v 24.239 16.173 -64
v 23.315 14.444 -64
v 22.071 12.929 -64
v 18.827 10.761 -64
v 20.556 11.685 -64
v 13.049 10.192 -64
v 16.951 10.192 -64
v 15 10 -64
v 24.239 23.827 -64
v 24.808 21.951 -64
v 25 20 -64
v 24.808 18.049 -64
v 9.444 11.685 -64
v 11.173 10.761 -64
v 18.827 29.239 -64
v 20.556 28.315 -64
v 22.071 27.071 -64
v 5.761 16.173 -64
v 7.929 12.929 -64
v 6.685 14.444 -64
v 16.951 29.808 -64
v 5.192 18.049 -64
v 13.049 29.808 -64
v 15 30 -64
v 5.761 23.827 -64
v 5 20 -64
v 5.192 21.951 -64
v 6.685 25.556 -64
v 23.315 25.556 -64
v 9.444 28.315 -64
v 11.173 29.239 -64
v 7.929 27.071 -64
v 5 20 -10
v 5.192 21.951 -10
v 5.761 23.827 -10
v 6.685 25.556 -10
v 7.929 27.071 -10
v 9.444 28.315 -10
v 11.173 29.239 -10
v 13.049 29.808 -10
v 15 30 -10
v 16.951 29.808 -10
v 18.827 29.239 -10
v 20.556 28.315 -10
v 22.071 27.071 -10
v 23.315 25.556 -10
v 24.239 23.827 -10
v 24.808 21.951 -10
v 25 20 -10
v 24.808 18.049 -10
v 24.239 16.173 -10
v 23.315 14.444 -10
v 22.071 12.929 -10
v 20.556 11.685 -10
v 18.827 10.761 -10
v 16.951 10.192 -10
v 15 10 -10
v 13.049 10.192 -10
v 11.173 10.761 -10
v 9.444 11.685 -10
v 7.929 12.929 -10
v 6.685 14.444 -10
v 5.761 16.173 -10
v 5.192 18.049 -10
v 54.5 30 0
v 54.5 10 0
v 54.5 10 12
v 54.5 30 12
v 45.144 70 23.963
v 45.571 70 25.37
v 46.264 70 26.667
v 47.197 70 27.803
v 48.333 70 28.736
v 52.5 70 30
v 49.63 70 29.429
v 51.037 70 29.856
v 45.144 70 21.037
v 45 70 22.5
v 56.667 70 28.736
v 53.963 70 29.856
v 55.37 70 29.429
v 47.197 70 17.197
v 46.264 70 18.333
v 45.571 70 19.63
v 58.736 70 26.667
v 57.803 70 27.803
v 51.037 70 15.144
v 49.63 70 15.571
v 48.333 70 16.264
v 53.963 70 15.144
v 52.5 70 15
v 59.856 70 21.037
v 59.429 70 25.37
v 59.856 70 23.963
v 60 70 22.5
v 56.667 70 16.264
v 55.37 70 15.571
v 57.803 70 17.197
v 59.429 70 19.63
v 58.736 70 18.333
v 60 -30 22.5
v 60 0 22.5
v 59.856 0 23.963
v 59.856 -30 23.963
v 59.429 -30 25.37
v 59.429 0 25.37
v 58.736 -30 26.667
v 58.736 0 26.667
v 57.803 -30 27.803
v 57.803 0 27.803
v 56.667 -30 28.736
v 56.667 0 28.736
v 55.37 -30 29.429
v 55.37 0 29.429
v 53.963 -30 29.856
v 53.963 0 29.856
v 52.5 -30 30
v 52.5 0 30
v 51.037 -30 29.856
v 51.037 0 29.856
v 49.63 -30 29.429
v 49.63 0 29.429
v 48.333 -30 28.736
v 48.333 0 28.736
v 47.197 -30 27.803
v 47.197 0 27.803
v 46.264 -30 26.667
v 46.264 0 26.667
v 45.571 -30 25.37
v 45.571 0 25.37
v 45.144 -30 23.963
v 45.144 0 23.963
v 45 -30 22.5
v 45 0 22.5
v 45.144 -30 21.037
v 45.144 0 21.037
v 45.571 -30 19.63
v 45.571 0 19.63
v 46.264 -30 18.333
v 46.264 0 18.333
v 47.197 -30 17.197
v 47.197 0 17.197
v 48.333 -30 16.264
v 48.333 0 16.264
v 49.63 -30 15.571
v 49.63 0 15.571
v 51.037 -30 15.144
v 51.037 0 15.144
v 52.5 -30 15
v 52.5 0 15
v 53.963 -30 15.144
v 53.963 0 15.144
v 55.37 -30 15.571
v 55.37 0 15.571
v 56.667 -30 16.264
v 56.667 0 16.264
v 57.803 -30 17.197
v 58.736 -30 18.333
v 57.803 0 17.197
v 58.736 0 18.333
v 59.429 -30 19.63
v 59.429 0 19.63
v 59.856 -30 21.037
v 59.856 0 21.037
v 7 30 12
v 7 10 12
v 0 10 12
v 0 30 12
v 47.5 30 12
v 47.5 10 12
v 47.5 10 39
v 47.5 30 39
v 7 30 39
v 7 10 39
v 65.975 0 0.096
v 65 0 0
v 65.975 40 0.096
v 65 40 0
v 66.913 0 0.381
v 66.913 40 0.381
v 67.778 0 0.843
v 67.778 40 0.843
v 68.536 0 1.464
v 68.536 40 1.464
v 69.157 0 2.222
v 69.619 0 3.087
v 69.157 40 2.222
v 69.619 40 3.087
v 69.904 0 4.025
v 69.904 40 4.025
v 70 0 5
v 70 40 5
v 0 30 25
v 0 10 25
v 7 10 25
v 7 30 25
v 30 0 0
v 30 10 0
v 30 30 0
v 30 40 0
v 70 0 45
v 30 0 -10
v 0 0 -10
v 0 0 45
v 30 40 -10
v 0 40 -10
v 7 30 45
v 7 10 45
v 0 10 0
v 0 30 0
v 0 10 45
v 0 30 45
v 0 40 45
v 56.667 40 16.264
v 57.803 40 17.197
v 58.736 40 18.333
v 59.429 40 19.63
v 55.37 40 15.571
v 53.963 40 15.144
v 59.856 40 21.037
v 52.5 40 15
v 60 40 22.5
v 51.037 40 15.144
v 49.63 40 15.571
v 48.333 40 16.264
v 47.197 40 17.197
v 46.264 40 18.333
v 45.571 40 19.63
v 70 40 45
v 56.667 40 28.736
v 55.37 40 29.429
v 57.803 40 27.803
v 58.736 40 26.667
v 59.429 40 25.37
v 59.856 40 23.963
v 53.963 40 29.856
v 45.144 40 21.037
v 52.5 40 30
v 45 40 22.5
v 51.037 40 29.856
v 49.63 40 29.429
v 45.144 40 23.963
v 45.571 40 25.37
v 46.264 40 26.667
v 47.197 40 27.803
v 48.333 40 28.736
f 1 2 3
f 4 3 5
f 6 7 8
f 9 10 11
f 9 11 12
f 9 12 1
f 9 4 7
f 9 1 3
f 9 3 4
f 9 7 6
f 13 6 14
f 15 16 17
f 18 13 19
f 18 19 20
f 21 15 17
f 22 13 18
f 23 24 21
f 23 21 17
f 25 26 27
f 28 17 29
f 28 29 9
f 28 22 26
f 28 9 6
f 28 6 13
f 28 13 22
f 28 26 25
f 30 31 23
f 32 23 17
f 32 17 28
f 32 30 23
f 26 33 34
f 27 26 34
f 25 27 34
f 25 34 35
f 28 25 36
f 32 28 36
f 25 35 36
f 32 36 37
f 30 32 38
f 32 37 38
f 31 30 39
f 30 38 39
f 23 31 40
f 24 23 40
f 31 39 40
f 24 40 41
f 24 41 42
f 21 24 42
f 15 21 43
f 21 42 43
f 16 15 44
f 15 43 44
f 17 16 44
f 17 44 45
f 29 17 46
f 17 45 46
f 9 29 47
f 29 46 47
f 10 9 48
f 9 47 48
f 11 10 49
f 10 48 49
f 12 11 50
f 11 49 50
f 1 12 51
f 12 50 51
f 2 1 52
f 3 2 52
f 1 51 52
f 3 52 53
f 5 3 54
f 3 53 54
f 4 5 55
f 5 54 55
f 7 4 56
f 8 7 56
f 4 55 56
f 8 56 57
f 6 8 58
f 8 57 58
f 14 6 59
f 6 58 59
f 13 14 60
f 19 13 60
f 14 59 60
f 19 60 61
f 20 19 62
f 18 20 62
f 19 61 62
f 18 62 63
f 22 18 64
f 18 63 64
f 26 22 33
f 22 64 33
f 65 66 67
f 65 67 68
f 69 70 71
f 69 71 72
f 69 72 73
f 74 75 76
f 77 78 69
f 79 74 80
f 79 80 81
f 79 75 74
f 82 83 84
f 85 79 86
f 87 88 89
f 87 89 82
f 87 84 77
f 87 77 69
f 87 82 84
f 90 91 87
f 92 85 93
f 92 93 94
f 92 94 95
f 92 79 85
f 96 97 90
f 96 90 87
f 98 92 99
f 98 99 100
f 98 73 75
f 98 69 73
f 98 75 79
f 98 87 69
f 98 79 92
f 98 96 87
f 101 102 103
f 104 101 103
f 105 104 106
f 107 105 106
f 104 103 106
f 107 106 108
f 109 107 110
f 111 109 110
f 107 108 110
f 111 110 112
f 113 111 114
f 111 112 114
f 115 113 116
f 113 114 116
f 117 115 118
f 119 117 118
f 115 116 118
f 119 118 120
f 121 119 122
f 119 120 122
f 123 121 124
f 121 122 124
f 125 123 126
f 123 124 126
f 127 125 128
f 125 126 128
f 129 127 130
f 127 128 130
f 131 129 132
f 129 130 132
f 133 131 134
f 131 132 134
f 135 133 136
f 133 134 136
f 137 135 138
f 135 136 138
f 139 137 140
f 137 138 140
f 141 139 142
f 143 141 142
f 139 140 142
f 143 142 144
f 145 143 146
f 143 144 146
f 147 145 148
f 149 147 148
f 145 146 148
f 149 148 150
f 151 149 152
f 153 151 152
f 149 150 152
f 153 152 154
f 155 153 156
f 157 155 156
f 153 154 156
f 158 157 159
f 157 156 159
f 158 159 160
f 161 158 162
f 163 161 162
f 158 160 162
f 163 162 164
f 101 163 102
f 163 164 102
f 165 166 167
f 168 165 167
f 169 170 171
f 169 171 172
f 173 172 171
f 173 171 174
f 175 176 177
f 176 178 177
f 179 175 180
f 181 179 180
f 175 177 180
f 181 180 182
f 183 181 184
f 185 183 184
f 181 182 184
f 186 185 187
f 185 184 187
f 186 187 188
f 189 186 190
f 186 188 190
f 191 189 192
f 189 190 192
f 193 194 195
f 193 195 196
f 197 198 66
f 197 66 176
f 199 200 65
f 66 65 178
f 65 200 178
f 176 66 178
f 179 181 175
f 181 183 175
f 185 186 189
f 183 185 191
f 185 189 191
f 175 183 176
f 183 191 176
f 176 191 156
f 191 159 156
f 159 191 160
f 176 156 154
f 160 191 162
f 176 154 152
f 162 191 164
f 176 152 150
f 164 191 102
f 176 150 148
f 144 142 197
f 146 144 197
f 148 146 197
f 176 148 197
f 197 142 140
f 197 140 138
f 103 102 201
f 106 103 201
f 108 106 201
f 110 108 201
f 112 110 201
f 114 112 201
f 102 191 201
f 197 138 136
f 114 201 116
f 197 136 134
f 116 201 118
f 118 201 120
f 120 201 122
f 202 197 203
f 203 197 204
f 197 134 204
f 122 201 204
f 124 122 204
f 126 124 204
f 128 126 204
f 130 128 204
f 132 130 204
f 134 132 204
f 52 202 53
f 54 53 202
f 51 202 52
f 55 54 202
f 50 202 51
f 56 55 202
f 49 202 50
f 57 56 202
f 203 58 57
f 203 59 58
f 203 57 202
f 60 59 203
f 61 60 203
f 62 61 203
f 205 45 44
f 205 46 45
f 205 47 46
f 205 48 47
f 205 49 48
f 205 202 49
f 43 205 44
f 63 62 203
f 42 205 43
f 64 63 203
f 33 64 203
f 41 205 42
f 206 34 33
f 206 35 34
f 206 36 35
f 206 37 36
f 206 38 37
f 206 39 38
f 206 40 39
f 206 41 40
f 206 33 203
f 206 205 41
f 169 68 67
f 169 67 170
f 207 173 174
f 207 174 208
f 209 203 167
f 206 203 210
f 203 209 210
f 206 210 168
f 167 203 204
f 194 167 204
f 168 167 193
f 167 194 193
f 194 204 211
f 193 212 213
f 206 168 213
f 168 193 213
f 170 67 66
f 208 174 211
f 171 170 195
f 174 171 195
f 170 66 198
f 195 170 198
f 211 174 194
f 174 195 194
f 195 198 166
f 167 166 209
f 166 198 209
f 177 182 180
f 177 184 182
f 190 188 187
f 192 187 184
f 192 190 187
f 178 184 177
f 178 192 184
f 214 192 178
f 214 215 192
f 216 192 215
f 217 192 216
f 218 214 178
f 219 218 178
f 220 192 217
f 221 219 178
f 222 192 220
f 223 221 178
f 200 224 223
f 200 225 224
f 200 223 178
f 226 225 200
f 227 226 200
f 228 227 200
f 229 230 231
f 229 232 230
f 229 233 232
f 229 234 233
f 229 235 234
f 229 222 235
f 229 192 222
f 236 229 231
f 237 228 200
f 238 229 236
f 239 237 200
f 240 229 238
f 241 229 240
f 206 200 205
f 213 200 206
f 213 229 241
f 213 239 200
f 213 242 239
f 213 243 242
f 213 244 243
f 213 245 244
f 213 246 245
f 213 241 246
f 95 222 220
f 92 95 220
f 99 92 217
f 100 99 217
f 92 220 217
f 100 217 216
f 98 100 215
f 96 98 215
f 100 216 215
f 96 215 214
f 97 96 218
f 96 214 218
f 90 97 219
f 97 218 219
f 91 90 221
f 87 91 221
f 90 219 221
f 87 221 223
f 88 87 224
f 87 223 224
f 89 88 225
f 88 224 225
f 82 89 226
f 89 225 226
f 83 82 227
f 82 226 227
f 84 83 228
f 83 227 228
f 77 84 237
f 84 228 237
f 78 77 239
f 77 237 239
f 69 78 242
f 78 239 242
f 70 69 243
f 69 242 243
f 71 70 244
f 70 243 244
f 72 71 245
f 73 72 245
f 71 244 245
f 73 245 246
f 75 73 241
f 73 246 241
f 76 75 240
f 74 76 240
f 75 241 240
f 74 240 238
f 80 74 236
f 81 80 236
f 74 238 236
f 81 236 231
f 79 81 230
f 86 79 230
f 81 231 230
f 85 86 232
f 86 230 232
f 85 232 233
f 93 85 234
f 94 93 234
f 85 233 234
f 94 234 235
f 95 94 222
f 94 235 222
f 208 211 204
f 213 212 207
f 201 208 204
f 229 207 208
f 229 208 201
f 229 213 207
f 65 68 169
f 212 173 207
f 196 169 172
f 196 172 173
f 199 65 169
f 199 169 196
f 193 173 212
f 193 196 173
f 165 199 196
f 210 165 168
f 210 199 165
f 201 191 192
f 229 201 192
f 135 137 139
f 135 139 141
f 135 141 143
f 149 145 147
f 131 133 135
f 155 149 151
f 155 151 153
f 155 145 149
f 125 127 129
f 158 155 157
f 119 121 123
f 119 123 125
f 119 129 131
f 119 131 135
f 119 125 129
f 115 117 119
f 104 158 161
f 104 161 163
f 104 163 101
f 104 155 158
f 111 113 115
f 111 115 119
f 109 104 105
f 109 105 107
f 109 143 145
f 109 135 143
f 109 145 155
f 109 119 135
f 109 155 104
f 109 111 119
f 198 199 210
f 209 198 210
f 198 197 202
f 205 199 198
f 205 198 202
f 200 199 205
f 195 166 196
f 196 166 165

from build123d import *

# Parameters (mm, degrees)
CROQUIS2_W              = 70
CROQUIS2_H              = 40
SALIENTE_EXTRUIR1_DEPTH = 45
CROQUIS3_W              = 40.5
CROQUIS3_H              = 20
CORTAR_EXTRUIR1_DEPTH   = 39
CROQUIS4_W              = 7
CROQUIS4_H              = 20
CORTAR_EXTRUIR2_DEPTH   = 12
CROQUIS5_W              = 20
CROQUIS5_H              = 20
CORTAR_EXTRUIR4_DEPTH   = 7
CROQUIS6_R              = 7.5
SALIENTE_EXTRUIR3_DEPTH = 30
CROQUIS8_R              = 7.5
SALIENTE_EXTRUIR4_DEPTH = 30
CROQUIS9_W              = 30
CROQUIS9_H              = 40
SALIENTE_EXTRUIR5_DEPTH = 10
CROQUIS10_R             = 10
SALIENTE_EXTRUIR6_DEPTH = 54
REDONDEO1_R             = 5


with BuildPart() as part:
    # Croquis2 → Saliente-Extruir1 (new body)
    with BuildSketch(Plane.XY):
        with Locations((35, 20)):
            Rectangle(CROQUIS2_W, CROQUIS2_H)
    extrude(amount=SALIENTE_EXTRUIR1_DEPTH)

    # Croquis3 → Cortar-Extruir1 (cut)
    with BuildSketch(Plane(origin=(0, 0, 0), x_dir=(-1, 0, 0), z_dir=(0, 0, -1))):
        with Locations((-27.25, 20)):
            Rectangle(CROQUIS3_W, CROQUIS3_H)
    extrude(amount=-CORTAR_EXTRUIR1_DEPTH, mode=Mode.SUBTRACT)

    # Croquis4 → Cortar-Extruir2 (cut)
    with BuildSketch(Plane(origin=(0, 0, 0), x_dir=(-1, 0, 0), z_dir=(0, 0, -1))):
        with Locations((-3.5, 20)):
            Rectangle(CROQUIS4_W, CROQUIS4_H)
        with Locations((-51, 20)):
            Rectangle(CROQUIS4_W, CROQUIS4_H)
    extrude(amount=-CORTAR_EXTRUIR2_DEPTH, mode=Mode.SUBTRACT)

    # Croquis5 → Cortar-Extruir4 (cut)
    with BuildSketch(Plane.ZY):
        with Locations((35, 20)):
            Rectangle(CROQUIS5_W, CROQUIS5_H)
    extrude(amount=-CORTAR_EXTRUIR4_DEPTH, mode=Mode.SUBTRACT)

    # Croquis6 → Saliente-Extruir3 (add)
    with BuildSketch(Plane(origin=(0, 40, 0), x_dir=(1, 0, 0), z_dir=(0, 1, 0))):
        with Locations((52.5, -22.5)):
            Circle(CROQUIS6_R)
    extrude(amount=SALIENTE_EXTRUIR3_DEPTH)

    # Croquis8 → Saliente-Extruir4 (add)
    with BuildSketch(Plane.XZ):
        with Locations((52.5, 22.5)):
            Circle(CROQUIS8_R)
    extrude(amount=SALIENTE_EXTRUIR4_DEPTH)

    # Croquis9 → Saliente-Extruir5 (add)
    with BuildSketch(Plane(origin=(0, 0, 0), x_dir=(-1, 0, 0), z_dir=(0, 0, -1))):
        with Locations((-15, 20)):
            Rectangle(CROQUIS9_W, CROQUIS9_H)
    extrude(amount=SALIENTE_EXTRUIR5_DEPTH)

    # Croquis10 → Saliente-Extruir6 (add)
    with BuildSketch(Plane(origin=(0, 0, -10), x_dir=(-1, 0, 0), z_dir=(0, 0, -1))):
        with Locations((-15, 20)):
            Circle(CROQUIS10_R)
    extrude(amount=SALIENTE_EXTRUIR6_DEPTH)

    # Redondeo1
    redondeo1_edges = [part.edges().sort_by_distance(p)[0] for p in [
        (70, 20, 0),
    ]]
    fillet(redondeo1_edges, radius=REDONDEO1_R)


solid = part.part
